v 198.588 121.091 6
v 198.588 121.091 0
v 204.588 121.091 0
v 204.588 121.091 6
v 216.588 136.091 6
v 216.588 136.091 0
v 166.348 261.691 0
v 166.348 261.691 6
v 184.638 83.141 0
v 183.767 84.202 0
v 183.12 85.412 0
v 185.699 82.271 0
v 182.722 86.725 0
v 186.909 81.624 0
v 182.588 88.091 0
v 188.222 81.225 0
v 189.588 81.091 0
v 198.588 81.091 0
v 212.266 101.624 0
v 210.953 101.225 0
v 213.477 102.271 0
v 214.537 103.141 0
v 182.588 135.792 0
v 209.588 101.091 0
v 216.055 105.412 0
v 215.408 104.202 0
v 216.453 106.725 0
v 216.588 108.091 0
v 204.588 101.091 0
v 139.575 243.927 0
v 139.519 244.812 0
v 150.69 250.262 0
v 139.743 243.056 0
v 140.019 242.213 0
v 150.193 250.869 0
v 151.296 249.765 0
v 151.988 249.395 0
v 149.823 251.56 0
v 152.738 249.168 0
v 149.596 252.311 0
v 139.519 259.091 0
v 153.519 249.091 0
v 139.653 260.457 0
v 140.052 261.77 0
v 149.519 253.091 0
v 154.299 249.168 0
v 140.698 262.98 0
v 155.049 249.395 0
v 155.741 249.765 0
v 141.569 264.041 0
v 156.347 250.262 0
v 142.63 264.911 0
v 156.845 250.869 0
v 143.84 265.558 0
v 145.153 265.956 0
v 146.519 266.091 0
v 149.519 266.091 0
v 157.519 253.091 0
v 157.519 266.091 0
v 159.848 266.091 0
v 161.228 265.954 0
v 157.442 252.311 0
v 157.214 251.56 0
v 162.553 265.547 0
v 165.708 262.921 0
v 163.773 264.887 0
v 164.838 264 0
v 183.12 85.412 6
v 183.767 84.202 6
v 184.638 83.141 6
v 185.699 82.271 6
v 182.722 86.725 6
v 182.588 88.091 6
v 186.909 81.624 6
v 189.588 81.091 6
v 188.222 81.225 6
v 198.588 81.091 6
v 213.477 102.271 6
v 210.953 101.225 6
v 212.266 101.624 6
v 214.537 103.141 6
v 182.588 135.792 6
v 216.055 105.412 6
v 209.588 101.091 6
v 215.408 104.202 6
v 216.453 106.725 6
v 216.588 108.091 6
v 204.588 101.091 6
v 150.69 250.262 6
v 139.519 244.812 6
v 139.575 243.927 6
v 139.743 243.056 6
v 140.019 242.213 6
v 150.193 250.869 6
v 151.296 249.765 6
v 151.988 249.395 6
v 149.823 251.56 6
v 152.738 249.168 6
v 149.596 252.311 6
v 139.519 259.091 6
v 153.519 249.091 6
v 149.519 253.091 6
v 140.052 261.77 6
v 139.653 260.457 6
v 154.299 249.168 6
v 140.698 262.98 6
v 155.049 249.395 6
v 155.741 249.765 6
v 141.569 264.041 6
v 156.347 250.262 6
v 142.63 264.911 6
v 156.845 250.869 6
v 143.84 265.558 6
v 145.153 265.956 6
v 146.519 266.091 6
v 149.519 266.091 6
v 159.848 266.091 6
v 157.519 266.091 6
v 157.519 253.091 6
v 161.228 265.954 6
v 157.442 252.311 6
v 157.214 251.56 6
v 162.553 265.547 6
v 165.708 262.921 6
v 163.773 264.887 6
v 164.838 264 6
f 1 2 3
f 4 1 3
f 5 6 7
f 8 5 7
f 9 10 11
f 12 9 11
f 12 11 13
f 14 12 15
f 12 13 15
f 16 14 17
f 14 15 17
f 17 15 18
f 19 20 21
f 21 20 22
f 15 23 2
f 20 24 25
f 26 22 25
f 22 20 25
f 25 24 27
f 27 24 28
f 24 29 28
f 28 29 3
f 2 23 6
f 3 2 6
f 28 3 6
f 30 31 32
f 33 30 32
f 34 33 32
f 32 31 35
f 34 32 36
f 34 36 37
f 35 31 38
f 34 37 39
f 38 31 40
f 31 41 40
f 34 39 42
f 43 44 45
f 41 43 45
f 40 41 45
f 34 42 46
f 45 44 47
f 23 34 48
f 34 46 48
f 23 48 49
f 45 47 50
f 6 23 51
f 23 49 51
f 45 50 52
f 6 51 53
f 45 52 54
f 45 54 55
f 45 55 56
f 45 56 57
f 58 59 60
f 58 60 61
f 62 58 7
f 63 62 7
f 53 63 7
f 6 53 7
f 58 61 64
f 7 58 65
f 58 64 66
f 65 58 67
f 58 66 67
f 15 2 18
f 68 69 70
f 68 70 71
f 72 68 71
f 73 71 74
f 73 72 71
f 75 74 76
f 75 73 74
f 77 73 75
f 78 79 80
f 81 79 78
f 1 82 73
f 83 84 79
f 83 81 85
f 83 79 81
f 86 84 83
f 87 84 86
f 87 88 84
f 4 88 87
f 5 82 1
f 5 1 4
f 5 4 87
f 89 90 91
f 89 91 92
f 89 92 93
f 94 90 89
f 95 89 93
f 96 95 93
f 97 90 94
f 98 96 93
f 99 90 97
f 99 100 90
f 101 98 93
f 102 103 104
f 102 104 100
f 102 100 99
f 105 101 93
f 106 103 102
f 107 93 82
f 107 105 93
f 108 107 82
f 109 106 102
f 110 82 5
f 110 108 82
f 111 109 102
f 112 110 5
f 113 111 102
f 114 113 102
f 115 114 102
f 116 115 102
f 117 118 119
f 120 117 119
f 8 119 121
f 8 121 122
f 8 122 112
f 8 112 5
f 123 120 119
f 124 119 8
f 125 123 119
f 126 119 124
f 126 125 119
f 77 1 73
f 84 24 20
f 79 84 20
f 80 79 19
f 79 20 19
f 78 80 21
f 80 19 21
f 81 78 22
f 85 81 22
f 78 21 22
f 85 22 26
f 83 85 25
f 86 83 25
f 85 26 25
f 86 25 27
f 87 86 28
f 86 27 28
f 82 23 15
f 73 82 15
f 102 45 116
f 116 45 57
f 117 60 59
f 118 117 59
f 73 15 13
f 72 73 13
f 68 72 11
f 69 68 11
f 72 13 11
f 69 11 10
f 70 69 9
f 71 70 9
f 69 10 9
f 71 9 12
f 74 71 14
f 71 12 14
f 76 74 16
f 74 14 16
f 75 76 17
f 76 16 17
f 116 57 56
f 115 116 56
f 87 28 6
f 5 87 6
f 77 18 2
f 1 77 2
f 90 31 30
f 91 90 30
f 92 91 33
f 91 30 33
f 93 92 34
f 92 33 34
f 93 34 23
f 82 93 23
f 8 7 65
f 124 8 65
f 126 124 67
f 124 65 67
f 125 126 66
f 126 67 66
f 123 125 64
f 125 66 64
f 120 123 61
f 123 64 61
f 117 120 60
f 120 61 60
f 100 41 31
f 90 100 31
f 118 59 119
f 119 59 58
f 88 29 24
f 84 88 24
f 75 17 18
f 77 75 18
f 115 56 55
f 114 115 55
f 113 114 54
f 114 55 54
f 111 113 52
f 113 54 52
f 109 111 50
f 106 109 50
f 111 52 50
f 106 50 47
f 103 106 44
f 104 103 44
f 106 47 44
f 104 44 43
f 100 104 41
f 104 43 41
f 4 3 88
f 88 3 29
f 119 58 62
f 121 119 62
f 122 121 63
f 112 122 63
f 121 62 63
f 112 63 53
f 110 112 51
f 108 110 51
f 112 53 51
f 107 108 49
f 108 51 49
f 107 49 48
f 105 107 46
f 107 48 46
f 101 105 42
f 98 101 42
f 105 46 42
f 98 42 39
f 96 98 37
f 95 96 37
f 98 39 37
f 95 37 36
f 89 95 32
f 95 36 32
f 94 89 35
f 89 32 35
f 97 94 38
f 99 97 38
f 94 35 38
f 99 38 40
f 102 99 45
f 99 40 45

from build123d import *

# Parameters (mm, degrees)
RESSALTO_EXTRUS_O1_DEPTH = 6


with BuildPart() as part:
    # Model → Ressalto-extrusão1 (new body)
    with BuildSketch(Plane.XY):
        with BuildLine():
            Line((216.587601096, 108.090872109), (216.587601096, 136.090872109))
            Line((216.587601096, 136.090872109), (166.347707202, 261.690606843))
            ThreePointArc((166.347707202, 261.690606843), (163.772772031, 264.887342722), (159.848370366, 266.090872109))
            Line((159.848370366, 266.090872109), (157.518730442, 266.090872109))
            Line((157.518730442, 266.090872109), (157.518730442, 253.090872109))
            ThreePointArc((157.518730442, 253.090872109), (153.518730442, 249.090872109), (149.518730442, 253.090872109))
            Line((149.518730442, 253.090872109), (149.518730442, 266.090872109))
            Line((149.518730442, 266.090872109), (146.518730442, 266.090872109))
            ThreePointArc((146.518730442, 266.090872109), (141.568982974, 264.040619577), (139.518730442, 259.090872109))
            Line((139.518730442, 259.090872109), (139.518730442, 244.812476299))
            ThreePointArc((139.518730442, 244.812476299), (139.645035735, 243.488723651), (140.019393606, 242.212741564))
            Line((140.019393606, 242.212741564), (182.587601096, 135.792222839))
            Line((182.587601096, 135.792222839), (182.587601096, 88.090872109))
            ThreePointArc((182.587601096, 88.090872109), (184.637853628, 83.141124641), (189.587601096, 81.090872109))
            Line((189.587601096, 81.090872109), (198.587601096, 81.090872109))
            Line((198.587601096, 81.090872109), (198.587601096, 121.090872109))
            Line((198.587601096, 121.090872109), (204.587601096, 121.090872109))
            Line((204.587601096, 121.090872109), (204.587601096, 101.090872109))
            Line((204.587601096, 101.090872109), (209.587601096, 101.090872109))
            ThreePointArc((209.587601096, 101.090872109), (214.537348564, 103.141124641), (216.587601096, 108.090872109))
        make_face()
    extrude(amount=RESSALTO_EXTRUS_O1_DEPTH)


solid = part.part
